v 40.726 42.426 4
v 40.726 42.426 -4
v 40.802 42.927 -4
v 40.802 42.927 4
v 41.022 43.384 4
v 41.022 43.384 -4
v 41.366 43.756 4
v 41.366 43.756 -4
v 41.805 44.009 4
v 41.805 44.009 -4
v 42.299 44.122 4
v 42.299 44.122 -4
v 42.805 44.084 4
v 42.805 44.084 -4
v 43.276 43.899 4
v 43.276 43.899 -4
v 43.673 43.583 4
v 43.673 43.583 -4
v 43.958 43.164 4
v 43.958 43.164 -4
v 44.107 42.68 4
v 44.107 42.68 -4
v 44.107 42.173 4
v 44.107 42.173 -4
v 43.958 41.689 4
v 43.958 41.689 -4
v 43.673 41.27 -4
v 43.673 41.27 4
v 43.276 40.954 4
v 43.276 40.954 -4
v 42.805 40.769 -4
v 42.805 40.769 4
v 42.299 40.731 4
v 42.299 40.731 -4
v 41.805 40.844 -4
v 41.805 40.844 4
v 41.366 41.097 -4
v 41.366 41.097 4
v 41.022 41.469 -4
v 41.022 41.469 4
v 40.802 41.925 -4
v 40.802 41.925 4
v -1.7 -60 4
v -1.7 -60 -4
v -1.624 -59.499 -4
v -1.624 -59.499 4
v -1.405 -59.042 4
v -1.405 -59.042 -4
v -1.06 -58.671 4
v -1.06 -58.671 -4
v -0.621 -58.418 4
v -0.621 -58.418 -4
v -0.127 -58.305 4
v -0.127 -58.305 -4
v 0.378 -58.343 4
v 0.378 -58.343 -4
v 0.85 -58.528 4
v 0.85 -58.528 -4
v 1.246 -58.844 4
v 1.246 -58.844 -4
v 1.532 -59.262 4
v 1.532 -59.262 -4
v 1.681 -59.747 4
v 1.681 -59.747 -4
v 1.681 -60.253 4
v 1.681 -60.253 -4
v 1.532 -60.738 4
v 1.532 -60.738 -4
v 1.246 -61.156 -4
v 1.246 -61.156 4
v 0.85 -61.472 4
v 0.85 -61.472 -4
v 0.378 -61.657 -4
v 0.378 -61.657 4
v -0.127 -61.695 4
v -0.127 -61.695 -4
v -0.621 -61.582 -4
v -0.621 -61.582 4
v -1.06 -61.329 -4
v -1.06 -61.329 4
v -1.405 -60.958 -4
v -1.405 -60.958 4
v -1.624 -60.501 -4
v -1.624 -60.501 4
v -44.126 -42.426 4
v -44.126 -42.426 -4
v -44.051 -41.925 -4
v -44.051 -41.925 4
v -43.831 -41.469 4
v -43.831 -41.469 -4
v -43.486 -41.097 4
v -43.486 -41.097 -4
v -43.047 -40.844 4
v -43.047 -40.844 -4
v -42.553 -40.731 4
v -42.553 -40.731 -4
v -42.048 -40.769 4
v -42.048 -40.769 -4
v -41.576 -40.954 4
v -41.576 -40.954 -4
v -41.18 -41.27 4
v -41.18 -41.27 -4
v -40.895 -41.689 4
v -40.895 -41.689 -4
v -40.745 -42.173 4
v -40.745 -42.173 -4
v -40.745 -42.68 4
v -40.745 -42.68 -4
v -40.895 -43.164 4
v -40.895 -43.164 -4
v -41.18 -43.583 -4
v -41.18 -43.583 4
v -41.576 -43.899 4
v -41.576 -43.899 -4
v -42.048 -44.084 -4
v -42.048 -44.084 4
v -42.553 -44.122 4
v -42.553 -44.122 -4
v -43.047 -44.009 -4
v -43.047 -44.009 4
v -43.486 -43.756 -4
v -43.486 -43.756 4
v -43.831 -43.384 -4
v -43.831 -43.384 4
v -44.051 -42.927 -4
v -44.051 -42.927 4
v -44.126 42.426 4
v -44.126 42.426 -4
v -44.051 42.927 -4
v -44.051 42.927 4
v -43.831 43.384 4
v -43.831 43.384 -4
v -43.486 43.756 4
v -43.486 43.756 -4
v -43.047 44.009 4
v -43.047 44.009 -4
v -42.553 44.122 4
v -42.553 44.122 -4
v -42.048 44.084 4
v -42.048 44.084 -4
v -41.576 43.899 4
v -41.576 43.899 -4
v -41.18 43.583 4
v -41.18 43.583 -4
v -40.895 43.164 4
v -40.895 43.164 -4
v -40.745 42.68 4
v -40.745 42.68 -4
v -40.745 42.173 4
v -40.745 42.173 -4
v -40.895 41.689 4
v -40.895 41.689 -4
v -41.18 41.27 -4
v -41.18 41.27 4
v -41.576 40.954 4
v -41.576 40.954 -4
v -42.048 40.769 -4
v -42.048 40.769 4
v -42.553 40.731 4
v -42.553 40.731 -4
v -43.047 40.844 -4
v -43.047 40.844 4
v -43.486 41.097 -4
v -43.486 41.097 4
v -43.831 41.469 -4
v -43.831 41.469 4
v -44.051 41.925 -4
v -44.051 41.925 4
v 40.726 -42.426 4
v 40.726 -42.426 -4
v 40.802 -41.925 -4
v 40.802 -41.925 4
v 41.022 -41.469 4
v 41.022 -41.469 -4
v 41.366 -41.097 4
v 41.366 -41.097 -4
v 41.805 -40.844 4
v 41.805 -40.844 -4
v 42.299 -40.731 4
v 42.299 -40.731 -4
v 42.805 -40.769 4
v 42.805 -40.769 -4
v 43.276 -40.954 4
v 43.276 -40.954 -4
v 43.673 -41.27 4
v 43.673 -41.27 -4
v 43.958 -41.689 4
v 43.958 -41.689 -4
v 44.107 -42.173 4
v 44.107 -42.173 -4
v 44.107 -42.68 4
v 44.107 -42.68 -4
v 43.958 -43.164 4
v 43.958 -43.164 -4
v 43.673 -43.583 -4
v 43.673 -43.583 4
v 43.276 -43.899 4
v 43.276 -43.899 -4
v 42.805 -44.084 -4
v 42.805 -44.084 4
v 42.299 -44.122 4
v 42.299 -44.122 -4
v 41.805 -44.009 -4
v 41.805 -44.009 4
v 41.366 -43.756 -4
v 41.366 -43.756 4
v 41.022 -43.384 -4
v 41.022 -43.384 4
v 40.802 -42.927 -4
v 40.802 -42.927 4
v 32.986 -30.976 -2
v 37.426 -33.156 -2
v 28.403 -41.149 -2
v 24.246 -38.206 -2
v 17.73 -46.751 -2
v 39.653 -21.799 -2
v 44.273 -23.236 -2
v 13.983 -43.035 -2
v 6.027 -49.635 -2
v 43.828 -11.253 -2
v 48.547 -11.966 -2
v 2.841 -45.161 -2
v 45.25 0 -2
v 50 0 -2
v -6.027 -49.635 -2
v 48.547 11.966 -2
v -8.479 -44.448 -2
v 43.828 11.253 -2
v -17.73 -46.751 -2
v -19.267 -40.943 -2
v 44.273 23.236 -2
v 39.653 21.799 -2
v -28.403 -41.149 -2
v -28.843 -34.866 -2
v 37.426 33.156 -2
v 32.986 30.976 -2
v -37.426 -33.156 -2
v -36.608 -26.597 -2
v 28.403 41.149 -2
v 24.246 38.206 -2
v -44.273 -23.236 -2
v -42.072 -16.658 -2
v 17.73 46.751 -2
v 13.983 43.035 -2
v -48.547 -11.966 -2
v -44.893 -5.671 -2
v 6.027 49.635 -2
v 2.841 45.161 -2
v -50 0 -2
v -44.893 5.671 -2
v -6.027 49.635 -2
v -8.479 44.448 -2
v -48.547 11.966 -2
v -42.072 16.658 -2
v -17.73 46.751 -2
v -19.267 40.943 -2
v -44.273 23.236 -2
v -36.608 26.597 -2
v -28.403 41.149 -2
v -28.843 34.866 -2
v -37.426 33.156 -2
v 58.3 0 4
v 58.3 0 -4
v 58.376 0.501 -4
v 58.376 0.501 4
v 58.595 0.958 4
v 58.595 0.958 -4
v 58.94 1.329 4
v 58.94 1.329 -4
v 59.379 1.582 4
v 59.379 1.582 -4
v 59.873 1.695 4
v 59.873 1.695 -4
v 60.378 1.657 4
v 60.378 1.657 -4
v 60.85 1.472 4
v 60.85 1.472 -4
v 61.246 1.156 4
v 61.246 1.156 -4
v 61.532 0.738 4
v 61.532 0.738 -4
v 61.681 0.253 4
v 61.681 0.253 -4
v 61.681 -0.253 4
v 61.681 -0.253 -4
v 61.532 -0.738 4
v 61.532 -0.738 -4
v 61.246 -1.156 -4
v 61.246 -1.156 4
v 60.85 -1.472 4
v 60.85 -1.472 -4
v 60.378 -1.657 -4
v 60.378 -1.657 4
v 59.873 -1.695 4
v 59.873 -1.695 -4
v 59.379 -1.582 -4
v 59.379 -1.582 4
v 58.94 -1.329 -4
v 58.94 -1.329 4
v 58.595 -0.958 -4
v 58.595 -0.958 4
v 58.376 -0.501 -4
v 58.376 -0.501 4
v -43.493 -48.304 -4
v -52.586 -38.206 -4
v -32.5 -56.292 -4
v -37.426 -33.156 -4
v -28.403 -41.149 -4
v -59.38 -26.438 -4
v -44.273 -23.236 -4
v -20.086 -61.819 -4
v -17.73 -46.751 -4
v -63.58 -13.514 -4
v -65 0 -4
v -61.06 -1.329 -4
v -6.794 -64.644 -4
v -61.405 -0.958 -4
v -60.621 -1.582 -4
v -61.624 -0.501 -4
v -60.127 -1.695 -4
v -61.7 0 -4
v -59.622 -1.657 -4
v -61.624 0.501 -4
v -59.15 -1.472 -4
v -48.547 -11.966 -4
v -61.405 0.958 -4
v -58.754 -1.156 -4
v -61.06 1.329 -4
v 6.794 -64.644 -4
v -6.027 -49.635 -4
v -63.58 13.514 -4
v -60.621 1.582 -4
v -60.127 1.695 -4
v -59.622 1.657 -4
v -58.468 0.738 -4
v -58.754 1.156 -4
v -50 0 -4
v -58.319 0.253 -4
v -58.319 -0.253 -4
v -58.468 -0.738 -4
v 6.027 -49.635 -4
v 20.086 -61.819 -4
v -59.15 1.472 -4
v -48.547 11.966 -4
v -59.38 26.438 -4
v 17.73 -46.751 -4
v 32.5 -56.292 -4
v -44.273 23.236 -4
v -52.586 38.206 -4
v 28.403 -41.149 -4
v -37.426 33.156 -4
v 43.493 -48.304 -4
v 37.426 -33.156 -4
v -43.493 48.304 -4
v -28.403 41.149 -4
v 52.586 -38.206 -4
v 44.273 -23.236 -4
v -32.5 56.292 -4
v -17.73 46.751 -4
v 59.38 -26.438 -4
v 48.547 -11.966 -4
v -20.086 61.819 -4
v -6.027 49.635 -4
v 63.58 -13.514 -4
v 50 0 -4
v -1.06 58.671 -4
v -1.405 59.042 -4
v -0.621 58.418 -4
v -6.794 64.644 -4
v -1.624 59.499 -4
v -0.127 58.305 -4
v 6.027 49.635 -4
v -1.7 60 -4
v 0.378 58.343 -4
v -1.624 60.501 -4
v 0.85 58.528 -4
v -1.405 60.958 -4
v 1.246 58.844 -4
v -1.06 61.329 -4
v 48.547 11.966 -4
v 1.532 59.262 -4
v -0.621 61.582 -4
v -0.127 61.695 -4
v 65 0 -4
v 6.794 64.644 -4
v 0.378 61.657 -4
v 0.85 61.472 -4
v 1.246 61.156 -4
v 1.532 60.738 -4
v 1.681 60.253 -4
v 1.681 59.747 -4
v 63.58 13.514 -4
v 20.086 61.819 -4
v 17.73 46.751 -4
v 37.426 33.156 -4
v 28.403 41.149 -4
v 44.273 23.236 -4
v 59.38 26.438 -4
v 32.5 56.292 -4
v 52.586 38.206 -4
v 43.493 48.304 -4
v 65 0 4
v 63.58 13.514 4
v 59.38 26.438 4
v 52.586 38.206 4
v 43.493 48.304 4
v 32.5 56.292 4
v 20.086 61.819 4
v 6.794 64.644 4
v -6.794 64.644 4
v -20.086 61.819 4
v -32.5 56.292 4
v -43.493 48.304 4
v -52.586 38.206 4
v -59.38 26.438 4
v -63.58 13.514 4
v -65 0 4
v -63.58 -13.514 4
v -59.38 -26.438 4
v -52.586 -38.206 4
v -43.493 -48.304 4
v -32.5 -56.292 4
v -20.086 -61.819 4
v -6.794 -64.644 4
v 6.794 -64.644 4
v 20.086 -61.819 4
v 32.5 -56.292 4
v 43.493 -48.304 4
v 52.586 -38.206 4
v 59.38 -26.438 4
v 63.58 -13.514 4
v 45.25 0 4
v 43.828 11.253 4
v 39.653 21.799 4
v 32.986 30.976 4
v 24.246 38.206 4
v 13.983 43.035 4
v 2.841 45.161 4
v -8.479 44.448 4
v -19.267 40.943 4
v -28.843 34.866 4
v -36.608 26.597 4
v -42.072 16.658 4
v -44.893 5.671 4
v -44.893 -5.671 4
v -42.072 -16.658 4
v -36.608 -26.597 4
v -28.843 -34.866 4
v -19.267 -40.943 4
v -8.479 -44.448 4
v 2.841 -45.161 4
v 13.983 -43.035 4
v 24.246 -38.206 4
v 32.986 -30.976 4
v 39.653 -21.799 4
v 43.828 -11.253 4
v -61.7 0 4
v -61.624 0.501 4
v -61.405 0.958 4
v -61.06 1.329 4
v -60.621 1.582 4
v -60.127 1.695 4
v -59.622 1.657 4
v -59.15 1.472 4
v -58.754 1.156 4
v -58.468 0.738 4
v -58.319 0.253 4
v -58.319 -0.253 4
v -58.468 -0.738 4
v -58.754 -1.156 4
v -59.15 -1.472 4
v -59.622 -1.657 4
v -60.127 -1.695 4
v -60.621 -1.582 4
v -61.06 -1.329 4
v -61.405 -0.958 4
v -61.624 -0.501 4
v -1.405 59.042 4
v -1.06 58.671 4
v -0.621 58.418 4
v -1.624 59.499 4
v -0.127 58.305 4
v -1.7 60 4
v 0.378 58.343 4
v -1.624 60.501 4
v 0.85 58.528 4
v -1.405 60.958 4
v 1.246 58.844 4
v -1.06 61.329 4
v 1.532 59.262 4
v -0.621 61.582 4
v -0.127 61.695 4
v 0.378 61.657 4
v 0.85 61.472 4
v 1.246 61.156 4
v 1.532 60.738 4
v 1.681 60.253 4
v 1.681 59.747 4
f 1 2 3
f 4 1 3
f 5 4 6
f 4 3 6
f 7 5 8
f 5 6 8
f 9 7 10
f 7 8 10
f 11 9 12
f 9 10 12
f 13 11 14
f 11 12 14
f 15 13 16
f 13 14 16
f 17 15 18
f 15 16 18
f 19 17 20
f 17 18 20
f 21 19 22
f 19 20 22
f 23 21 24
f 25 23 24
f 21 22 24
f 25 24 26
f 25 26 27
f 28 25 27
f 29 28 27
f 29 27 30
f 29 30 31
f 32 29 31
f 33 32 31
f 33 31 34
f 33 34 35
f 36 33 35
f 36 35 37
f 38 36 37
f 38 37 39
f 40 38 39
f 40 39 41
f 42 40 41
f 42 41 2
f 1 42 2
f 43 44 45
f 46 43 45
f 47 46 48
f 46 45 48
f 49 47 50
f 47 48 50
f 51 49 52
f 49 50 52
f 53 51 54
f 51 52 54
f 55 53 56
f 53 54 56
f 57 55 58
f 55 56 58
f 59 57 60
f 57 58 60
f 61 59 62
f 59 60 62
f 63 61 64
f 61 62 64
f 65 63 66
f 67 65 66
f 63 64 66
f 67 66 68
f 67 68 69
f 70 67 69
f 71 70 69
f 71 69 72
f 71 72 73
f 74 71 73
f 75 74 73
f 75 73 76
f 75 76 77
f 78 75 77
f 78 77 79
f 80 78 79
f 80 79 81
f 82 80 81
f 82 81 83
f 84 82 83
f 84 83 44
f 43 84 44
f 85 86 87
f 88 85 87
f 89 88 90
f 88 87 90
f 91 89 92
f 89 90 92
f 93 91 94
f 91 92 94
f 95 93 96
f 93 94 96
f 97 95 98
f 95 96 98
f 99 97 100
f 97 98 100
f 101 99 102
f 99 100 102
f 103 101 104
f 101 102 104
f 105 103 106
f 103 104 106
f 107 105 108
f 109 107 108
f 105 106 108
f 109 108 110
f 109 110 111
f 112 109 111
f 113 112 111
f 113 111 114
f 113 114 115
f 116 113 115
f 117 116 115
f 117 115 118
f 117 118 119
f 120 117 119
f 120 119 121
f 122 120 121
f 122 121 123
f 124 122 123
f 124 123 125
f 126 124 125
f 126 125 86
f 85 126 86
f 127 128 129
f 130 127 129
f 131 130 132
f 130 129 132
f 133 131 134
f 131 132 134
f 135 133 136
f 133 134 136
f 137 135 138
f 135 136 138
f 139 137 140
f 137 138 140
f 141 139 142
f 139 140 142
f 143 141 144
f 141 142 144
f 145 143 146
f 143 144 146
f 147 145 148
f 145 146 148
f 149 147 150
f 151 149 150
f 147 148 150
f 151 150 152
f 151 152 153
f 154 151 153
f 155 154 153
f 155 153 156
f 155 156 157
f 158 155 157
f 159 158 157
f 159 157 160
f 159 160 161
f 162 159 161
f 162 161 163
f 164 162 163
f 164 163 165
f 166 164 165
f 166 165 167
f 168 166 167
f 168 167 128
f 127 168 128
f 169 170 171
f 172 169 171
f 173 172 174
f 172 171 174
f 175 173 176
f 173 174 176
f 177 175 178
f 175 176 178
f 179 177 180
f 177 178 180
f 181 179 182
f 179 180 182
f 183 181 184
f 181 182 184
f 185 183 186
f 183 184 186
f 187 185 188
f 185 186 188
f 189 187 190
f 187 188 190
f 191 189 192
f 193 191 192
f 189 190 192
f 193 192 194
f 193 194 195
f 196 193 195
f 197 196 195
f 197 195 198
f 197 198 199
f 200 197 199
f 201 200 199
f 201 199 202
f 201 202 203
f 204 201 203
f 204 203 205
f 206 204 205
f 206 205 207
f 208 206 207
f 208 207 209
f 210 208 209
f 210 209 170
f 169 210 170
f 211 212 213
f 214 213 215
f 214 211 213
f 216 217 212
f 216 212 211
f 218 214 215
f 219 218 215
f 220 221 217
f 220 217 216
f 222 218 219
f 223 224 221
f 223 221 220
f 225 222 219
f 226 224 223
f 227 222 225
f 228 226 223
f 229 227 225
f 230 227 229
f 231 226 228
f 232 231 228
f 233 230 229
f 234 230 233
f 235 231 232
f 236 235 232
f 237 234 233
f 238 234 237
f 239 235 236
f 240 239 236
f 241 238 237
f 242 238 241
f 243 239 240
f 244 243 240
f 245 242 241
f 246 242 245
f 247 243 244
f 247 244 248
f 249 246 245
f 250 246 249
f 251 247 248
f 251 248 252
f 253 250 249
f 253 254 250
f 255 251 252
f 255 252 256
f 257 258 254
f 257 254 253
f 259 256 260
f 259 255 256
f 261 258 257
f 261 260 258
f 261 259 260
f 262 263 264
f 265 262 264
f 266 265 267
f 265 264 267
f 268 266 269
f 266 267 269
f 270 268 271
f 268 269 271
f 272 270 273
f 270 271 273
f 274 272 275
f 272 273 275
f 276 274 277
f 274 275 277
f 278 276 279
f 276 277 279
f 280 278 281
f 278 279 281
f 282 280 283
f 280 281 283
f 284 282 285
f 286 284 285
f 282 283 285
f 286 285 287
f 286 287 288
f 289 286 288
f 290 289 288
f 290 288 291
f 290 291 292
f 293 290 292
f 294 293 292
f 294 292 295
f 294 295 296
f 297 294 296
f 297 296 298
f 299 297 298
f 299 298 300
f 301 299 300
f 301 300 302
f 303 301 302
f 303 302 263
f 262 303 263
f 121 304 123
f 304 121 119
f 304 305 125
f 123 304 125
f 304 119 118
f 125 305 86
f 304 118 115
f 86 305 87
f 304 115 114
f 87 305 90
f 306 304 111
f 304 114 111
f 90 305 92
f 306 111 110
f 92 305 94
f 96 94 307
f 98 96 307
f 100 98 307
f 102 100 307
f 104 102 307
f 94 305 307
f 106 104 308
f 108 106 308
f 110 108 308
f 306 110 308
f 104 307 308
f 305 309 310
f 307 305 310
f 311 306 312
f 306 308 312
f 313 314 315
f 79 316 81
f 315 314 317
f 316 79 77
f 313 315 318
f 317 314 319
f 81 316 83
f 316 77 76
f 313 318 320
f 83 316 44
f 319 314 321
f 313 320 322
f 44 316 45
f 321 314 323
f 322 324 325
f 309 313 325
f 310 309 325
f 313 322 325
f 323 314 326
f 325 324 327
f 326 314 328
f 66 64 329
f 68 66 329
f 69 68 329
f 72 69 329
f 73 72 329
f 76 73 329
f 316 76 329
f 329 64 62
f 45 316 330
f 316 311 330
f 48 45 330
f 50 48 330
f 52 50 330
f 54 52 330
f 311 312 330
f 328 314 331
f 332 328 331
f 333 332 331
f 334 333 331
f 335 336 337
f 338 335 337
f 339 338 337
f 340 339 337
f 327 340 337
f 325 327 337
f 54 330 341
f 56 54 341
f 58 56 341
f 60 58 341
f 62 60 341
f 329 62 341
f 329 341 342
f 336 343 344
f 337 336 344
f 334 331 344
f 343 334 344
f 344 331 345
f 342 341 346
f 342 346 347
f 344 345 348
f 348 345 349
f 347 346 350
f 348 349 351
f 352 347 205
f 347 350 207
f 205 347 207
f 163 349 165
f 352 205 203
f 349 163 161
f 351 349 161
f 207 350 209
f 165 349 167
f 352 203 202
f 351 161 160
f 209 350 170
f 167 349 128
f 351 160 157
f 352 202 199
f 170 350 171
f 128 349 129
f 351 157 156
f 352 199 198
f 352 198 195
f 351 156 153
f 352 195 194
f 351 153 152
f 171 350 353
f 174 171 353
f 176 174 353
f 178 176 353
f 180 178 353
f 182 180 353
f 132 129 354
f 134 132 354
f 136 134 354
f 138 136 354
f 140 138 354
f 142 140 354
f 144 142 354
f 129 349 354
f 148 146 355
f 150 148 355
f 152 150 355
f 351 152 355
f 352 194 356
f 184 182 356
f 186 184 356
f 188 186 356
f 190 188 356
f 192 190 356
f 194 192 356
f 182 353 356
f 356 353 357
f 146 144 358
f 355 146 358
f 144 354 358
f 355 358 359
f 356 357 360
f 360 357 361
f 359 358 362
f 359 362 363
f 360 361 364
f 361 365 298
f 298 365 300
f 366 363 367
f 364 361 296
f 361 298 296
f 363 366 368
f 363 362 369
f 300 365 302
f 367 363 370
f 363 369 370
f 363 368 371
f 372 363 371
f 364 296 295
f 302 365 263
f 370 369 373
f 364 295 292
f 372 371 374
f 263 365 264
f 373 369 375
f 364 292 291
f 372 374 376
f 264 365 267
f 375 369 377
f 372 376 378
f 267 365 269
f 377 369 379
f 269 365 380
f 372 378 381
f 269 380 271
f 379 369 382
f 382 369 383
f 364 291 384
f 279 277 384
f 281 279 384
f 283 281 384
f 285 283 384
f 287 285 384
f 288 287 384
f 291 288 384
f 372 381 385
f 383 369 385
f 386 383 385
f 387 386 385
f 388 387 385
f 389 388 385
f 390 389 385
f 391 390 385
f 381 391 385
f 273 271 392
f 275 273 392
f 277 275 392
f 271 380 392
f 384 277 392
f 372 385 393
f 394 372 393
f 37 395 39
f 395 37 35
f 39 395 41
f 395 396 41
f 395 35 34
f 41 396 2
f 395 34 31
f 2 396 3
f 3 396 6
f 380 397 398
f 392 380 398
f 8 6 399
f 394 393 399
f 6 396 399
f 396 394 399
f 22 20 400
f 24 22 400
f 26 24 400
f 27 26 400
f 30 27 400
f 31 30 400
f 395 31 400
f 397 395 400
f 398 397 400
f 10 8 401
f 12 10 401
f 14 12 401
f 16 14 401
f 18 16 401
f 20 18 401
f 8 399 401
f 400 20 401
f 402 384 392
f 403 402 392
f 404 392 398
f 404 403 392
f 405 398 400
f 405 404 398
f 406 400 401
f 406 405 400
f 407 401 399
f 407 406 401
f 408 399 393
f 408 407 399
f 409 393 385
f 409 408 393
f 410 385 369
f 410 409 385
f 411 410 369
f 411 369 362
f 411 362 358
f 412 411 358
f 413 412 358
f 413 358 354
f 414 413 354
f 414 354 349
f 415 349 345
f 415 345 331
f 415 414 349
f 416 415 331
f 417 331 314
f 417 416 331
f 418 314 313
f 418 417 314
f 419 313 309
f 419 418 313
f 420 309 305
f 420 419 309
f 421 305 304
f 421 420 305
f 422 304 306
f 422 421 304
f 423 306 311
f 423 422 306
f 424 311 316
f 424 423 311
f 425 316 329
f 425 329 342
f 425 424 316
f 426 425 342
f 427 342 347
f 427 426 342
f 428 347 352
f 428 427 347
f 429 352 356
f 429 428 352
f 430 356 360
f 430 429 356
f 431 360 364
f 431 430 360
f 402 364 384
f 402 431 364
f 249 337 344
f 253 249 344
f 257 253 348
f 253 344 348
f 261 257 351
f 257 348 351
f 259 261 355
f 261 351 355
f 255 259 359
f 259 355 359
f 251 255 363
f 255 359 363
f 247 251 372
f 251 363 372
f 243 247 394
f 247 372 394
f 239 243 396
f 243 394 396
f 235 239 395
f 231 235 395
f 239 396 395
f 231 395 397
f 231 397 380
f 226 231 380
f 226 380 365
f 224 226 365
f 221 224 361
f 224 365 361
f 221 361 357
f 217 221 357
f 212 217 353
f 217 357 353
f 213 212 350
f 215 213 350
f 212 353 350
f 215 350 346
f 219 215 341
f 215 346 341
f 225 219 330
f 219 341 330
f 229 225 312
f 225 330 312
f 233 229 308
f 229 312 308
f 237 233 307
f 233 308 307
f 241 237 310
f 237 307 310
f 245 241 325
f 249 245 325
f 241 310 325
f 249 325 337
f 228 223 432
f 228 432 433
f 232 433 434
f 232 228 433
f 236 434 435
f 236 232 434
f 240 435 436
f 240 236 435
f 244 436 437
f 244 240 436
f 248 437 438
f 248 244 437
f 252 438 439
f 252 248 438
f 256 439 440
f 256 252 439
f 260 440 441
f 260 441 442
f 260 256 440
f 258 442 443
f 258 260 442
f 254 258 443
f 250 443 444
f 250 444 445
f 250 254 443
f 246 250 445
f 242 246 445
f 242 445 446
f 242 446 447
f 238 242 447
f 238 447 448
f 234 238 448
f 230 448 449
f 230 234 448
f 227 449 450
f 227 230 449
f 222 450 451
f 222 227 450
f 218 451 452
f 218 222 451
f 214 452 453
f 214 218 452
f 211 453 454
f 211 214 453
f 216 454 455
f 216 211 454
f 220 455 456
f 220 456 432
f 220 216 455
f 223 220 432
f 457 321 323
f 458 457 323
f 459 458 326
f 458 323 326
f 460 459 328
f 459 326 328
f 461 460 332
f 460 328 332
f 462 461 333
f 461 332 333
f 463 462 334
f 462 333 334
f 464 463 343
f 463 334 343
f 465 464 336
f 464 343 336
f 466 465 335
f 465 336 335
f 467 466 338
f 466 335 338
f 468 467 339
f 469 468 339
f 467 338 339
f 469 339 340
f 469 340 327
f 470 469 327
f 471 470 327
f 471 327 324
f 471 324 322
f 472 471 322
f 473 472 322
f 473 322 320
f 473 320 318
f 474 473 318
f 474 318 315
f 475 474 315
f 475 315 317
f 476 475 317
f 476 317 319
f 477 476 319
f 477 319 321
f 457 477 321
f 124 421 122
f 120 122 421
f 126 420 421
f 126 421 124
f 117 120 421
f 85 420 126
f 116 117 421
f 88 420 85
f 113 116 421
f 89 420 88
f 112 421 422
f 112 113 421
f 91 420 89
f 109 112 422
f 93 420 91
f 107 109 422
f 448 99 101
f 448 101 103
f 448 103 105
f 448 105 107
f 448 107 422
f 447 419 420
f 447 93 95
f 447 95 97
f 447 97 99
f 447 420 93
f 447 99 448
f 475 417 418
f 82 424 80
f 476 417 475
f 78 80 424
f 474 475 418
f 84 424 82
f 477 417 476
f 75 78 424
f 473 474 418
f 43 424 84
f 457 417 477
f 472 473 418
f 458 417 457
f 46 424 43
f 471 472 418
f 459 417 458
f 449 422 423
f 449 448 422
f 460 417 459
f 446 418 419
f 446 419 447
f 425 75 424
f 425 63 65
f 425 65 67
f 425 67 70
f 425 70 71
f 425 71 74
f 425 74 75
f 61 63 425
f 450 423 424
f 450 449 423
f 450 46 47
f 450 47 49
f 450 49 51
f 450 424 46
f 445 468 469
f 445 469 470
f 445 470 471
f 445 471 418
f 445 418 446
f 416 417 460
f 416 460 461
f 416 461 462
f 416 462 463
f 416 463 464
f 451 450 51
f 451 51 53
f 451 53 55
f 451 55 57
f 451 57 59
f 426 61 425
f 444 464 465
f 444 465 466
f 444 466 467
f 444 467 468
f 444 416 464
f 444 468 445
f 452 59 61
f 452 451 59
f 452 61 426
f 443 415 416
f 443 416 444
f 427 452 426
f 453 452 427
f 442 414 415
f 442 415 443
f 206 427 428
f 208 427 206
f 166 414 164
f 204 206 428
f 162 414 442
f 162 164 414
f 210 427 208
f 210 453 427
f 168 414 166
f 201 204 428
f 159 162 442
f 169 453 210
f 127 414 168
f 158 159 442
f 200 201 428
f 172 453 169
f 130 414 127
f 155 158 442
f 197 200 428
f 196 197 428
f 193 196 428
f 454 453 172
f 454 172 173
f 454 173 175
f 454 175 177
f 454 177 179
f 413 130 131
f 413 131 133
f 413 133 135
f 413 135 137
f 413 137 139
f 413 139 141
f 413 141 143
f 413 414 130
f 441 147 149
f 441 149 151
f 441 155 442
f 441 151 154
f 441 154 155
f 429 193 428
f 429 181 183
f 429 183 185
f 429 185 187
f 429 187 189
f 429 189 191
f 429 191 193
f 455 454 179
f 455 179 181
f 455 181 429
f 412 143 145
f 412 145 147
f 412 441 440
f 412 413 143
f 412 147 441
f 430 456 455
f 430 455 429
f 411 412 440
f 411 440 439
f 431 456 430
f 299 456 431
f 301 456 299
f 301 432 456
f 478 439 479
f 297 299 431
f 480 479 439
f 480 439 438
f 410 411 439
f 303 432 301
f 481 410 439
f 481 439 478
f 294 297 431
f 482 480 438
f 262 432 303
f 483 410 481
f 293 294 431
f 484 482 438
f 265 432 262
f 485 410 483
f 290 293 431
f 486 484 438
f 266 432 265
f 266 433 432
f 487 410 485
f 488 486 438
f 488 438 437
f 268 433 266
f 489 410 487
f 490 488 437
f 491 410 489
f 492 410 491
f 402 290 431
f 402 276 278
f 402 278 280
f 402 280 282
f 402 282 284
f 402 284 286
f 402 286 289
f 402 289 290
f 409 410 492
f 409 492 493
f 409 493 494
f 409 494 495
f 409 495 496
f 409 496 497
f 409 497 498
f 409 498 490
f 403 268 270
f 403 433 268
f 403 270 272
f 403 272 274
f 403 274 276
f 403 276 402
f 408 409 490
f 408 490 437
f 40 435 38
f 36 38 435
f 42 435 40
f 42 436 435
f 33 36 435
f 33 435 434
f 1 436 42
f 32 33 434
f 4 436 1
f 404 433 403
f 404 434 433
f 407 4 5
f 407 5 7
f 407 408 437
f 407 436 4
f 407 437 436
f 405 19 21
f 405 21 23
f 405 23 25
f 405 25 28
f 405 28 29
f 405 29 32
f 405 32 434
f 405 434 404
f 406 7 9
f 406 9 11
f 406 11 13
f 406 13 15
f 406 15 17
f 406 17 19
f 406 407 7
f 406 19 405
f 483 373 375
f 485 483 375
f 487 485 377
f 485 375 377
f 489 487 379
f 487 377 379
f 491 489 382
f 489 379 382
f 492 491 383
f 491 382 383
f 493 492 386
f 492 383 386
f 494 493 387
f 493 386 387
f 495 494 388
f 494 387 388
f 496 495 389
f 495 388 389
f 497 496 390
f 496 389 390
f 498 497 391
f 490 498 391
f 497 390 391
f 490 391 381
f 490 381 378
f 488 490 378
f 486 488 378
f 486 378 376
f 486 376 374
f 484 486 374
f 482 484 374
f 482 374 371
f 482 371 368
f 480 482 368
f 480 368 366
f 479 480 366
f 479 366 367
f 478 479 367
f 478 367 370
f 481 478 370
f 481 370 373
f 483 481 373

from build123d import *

# Parameters (mm, degrees)
CROQUIS1_R                   = 65
CROQUIS1_R_2                 = 45.25
SALIENTE_EXTRUIR1_DEPTH      = 4
TALADRO_DE_MARGEN_PARA_M31_D = 3.4
CROQUIS4_R                   = 50
CORTAR_EXTRUIR1_DEPTH        = 2


with BuildPart() as part:
    # Croquis1 → Saliente-Extruir1 (new, symmetric)
    with BuildSketch(Plane.XY):
        Circle(CROQUIS1_R)
        Circle(CROQUIS1_R_2, mode=Mode.SUBTRACT)
    extrude(amount=SALIENTE_EXTRUIR1_DEPTH, both=True)

    # Taladro de margen para M31 (through all)
    with Locations(Plane.XY.offset(4)):
        with Locations((0, 60), (42.426406871, 42.426406871), (60, 0), (42.426406871, -42.426406871), (0, -60), (-42.426406871, -42.426406871), (-60, 0), (-42.426406871, 42.426406871)):
            Hole(TALADRO_DE_MARGEN_PARA_M31_D / 2)

    # Croquis4 → Cortar-Extruir1 (cut)
    with BuildSketch(Plane(origin=(0, 0, -4), x_dir=(-1, 0, 0), z_dir=(0, 0, -1))):
        Circle(CROQUIS4_R)
    extrude(amount=-CORTAR_EXTRUIR1_DEPTH, mode=Mode.SUBTRACT)


solid = part.part
